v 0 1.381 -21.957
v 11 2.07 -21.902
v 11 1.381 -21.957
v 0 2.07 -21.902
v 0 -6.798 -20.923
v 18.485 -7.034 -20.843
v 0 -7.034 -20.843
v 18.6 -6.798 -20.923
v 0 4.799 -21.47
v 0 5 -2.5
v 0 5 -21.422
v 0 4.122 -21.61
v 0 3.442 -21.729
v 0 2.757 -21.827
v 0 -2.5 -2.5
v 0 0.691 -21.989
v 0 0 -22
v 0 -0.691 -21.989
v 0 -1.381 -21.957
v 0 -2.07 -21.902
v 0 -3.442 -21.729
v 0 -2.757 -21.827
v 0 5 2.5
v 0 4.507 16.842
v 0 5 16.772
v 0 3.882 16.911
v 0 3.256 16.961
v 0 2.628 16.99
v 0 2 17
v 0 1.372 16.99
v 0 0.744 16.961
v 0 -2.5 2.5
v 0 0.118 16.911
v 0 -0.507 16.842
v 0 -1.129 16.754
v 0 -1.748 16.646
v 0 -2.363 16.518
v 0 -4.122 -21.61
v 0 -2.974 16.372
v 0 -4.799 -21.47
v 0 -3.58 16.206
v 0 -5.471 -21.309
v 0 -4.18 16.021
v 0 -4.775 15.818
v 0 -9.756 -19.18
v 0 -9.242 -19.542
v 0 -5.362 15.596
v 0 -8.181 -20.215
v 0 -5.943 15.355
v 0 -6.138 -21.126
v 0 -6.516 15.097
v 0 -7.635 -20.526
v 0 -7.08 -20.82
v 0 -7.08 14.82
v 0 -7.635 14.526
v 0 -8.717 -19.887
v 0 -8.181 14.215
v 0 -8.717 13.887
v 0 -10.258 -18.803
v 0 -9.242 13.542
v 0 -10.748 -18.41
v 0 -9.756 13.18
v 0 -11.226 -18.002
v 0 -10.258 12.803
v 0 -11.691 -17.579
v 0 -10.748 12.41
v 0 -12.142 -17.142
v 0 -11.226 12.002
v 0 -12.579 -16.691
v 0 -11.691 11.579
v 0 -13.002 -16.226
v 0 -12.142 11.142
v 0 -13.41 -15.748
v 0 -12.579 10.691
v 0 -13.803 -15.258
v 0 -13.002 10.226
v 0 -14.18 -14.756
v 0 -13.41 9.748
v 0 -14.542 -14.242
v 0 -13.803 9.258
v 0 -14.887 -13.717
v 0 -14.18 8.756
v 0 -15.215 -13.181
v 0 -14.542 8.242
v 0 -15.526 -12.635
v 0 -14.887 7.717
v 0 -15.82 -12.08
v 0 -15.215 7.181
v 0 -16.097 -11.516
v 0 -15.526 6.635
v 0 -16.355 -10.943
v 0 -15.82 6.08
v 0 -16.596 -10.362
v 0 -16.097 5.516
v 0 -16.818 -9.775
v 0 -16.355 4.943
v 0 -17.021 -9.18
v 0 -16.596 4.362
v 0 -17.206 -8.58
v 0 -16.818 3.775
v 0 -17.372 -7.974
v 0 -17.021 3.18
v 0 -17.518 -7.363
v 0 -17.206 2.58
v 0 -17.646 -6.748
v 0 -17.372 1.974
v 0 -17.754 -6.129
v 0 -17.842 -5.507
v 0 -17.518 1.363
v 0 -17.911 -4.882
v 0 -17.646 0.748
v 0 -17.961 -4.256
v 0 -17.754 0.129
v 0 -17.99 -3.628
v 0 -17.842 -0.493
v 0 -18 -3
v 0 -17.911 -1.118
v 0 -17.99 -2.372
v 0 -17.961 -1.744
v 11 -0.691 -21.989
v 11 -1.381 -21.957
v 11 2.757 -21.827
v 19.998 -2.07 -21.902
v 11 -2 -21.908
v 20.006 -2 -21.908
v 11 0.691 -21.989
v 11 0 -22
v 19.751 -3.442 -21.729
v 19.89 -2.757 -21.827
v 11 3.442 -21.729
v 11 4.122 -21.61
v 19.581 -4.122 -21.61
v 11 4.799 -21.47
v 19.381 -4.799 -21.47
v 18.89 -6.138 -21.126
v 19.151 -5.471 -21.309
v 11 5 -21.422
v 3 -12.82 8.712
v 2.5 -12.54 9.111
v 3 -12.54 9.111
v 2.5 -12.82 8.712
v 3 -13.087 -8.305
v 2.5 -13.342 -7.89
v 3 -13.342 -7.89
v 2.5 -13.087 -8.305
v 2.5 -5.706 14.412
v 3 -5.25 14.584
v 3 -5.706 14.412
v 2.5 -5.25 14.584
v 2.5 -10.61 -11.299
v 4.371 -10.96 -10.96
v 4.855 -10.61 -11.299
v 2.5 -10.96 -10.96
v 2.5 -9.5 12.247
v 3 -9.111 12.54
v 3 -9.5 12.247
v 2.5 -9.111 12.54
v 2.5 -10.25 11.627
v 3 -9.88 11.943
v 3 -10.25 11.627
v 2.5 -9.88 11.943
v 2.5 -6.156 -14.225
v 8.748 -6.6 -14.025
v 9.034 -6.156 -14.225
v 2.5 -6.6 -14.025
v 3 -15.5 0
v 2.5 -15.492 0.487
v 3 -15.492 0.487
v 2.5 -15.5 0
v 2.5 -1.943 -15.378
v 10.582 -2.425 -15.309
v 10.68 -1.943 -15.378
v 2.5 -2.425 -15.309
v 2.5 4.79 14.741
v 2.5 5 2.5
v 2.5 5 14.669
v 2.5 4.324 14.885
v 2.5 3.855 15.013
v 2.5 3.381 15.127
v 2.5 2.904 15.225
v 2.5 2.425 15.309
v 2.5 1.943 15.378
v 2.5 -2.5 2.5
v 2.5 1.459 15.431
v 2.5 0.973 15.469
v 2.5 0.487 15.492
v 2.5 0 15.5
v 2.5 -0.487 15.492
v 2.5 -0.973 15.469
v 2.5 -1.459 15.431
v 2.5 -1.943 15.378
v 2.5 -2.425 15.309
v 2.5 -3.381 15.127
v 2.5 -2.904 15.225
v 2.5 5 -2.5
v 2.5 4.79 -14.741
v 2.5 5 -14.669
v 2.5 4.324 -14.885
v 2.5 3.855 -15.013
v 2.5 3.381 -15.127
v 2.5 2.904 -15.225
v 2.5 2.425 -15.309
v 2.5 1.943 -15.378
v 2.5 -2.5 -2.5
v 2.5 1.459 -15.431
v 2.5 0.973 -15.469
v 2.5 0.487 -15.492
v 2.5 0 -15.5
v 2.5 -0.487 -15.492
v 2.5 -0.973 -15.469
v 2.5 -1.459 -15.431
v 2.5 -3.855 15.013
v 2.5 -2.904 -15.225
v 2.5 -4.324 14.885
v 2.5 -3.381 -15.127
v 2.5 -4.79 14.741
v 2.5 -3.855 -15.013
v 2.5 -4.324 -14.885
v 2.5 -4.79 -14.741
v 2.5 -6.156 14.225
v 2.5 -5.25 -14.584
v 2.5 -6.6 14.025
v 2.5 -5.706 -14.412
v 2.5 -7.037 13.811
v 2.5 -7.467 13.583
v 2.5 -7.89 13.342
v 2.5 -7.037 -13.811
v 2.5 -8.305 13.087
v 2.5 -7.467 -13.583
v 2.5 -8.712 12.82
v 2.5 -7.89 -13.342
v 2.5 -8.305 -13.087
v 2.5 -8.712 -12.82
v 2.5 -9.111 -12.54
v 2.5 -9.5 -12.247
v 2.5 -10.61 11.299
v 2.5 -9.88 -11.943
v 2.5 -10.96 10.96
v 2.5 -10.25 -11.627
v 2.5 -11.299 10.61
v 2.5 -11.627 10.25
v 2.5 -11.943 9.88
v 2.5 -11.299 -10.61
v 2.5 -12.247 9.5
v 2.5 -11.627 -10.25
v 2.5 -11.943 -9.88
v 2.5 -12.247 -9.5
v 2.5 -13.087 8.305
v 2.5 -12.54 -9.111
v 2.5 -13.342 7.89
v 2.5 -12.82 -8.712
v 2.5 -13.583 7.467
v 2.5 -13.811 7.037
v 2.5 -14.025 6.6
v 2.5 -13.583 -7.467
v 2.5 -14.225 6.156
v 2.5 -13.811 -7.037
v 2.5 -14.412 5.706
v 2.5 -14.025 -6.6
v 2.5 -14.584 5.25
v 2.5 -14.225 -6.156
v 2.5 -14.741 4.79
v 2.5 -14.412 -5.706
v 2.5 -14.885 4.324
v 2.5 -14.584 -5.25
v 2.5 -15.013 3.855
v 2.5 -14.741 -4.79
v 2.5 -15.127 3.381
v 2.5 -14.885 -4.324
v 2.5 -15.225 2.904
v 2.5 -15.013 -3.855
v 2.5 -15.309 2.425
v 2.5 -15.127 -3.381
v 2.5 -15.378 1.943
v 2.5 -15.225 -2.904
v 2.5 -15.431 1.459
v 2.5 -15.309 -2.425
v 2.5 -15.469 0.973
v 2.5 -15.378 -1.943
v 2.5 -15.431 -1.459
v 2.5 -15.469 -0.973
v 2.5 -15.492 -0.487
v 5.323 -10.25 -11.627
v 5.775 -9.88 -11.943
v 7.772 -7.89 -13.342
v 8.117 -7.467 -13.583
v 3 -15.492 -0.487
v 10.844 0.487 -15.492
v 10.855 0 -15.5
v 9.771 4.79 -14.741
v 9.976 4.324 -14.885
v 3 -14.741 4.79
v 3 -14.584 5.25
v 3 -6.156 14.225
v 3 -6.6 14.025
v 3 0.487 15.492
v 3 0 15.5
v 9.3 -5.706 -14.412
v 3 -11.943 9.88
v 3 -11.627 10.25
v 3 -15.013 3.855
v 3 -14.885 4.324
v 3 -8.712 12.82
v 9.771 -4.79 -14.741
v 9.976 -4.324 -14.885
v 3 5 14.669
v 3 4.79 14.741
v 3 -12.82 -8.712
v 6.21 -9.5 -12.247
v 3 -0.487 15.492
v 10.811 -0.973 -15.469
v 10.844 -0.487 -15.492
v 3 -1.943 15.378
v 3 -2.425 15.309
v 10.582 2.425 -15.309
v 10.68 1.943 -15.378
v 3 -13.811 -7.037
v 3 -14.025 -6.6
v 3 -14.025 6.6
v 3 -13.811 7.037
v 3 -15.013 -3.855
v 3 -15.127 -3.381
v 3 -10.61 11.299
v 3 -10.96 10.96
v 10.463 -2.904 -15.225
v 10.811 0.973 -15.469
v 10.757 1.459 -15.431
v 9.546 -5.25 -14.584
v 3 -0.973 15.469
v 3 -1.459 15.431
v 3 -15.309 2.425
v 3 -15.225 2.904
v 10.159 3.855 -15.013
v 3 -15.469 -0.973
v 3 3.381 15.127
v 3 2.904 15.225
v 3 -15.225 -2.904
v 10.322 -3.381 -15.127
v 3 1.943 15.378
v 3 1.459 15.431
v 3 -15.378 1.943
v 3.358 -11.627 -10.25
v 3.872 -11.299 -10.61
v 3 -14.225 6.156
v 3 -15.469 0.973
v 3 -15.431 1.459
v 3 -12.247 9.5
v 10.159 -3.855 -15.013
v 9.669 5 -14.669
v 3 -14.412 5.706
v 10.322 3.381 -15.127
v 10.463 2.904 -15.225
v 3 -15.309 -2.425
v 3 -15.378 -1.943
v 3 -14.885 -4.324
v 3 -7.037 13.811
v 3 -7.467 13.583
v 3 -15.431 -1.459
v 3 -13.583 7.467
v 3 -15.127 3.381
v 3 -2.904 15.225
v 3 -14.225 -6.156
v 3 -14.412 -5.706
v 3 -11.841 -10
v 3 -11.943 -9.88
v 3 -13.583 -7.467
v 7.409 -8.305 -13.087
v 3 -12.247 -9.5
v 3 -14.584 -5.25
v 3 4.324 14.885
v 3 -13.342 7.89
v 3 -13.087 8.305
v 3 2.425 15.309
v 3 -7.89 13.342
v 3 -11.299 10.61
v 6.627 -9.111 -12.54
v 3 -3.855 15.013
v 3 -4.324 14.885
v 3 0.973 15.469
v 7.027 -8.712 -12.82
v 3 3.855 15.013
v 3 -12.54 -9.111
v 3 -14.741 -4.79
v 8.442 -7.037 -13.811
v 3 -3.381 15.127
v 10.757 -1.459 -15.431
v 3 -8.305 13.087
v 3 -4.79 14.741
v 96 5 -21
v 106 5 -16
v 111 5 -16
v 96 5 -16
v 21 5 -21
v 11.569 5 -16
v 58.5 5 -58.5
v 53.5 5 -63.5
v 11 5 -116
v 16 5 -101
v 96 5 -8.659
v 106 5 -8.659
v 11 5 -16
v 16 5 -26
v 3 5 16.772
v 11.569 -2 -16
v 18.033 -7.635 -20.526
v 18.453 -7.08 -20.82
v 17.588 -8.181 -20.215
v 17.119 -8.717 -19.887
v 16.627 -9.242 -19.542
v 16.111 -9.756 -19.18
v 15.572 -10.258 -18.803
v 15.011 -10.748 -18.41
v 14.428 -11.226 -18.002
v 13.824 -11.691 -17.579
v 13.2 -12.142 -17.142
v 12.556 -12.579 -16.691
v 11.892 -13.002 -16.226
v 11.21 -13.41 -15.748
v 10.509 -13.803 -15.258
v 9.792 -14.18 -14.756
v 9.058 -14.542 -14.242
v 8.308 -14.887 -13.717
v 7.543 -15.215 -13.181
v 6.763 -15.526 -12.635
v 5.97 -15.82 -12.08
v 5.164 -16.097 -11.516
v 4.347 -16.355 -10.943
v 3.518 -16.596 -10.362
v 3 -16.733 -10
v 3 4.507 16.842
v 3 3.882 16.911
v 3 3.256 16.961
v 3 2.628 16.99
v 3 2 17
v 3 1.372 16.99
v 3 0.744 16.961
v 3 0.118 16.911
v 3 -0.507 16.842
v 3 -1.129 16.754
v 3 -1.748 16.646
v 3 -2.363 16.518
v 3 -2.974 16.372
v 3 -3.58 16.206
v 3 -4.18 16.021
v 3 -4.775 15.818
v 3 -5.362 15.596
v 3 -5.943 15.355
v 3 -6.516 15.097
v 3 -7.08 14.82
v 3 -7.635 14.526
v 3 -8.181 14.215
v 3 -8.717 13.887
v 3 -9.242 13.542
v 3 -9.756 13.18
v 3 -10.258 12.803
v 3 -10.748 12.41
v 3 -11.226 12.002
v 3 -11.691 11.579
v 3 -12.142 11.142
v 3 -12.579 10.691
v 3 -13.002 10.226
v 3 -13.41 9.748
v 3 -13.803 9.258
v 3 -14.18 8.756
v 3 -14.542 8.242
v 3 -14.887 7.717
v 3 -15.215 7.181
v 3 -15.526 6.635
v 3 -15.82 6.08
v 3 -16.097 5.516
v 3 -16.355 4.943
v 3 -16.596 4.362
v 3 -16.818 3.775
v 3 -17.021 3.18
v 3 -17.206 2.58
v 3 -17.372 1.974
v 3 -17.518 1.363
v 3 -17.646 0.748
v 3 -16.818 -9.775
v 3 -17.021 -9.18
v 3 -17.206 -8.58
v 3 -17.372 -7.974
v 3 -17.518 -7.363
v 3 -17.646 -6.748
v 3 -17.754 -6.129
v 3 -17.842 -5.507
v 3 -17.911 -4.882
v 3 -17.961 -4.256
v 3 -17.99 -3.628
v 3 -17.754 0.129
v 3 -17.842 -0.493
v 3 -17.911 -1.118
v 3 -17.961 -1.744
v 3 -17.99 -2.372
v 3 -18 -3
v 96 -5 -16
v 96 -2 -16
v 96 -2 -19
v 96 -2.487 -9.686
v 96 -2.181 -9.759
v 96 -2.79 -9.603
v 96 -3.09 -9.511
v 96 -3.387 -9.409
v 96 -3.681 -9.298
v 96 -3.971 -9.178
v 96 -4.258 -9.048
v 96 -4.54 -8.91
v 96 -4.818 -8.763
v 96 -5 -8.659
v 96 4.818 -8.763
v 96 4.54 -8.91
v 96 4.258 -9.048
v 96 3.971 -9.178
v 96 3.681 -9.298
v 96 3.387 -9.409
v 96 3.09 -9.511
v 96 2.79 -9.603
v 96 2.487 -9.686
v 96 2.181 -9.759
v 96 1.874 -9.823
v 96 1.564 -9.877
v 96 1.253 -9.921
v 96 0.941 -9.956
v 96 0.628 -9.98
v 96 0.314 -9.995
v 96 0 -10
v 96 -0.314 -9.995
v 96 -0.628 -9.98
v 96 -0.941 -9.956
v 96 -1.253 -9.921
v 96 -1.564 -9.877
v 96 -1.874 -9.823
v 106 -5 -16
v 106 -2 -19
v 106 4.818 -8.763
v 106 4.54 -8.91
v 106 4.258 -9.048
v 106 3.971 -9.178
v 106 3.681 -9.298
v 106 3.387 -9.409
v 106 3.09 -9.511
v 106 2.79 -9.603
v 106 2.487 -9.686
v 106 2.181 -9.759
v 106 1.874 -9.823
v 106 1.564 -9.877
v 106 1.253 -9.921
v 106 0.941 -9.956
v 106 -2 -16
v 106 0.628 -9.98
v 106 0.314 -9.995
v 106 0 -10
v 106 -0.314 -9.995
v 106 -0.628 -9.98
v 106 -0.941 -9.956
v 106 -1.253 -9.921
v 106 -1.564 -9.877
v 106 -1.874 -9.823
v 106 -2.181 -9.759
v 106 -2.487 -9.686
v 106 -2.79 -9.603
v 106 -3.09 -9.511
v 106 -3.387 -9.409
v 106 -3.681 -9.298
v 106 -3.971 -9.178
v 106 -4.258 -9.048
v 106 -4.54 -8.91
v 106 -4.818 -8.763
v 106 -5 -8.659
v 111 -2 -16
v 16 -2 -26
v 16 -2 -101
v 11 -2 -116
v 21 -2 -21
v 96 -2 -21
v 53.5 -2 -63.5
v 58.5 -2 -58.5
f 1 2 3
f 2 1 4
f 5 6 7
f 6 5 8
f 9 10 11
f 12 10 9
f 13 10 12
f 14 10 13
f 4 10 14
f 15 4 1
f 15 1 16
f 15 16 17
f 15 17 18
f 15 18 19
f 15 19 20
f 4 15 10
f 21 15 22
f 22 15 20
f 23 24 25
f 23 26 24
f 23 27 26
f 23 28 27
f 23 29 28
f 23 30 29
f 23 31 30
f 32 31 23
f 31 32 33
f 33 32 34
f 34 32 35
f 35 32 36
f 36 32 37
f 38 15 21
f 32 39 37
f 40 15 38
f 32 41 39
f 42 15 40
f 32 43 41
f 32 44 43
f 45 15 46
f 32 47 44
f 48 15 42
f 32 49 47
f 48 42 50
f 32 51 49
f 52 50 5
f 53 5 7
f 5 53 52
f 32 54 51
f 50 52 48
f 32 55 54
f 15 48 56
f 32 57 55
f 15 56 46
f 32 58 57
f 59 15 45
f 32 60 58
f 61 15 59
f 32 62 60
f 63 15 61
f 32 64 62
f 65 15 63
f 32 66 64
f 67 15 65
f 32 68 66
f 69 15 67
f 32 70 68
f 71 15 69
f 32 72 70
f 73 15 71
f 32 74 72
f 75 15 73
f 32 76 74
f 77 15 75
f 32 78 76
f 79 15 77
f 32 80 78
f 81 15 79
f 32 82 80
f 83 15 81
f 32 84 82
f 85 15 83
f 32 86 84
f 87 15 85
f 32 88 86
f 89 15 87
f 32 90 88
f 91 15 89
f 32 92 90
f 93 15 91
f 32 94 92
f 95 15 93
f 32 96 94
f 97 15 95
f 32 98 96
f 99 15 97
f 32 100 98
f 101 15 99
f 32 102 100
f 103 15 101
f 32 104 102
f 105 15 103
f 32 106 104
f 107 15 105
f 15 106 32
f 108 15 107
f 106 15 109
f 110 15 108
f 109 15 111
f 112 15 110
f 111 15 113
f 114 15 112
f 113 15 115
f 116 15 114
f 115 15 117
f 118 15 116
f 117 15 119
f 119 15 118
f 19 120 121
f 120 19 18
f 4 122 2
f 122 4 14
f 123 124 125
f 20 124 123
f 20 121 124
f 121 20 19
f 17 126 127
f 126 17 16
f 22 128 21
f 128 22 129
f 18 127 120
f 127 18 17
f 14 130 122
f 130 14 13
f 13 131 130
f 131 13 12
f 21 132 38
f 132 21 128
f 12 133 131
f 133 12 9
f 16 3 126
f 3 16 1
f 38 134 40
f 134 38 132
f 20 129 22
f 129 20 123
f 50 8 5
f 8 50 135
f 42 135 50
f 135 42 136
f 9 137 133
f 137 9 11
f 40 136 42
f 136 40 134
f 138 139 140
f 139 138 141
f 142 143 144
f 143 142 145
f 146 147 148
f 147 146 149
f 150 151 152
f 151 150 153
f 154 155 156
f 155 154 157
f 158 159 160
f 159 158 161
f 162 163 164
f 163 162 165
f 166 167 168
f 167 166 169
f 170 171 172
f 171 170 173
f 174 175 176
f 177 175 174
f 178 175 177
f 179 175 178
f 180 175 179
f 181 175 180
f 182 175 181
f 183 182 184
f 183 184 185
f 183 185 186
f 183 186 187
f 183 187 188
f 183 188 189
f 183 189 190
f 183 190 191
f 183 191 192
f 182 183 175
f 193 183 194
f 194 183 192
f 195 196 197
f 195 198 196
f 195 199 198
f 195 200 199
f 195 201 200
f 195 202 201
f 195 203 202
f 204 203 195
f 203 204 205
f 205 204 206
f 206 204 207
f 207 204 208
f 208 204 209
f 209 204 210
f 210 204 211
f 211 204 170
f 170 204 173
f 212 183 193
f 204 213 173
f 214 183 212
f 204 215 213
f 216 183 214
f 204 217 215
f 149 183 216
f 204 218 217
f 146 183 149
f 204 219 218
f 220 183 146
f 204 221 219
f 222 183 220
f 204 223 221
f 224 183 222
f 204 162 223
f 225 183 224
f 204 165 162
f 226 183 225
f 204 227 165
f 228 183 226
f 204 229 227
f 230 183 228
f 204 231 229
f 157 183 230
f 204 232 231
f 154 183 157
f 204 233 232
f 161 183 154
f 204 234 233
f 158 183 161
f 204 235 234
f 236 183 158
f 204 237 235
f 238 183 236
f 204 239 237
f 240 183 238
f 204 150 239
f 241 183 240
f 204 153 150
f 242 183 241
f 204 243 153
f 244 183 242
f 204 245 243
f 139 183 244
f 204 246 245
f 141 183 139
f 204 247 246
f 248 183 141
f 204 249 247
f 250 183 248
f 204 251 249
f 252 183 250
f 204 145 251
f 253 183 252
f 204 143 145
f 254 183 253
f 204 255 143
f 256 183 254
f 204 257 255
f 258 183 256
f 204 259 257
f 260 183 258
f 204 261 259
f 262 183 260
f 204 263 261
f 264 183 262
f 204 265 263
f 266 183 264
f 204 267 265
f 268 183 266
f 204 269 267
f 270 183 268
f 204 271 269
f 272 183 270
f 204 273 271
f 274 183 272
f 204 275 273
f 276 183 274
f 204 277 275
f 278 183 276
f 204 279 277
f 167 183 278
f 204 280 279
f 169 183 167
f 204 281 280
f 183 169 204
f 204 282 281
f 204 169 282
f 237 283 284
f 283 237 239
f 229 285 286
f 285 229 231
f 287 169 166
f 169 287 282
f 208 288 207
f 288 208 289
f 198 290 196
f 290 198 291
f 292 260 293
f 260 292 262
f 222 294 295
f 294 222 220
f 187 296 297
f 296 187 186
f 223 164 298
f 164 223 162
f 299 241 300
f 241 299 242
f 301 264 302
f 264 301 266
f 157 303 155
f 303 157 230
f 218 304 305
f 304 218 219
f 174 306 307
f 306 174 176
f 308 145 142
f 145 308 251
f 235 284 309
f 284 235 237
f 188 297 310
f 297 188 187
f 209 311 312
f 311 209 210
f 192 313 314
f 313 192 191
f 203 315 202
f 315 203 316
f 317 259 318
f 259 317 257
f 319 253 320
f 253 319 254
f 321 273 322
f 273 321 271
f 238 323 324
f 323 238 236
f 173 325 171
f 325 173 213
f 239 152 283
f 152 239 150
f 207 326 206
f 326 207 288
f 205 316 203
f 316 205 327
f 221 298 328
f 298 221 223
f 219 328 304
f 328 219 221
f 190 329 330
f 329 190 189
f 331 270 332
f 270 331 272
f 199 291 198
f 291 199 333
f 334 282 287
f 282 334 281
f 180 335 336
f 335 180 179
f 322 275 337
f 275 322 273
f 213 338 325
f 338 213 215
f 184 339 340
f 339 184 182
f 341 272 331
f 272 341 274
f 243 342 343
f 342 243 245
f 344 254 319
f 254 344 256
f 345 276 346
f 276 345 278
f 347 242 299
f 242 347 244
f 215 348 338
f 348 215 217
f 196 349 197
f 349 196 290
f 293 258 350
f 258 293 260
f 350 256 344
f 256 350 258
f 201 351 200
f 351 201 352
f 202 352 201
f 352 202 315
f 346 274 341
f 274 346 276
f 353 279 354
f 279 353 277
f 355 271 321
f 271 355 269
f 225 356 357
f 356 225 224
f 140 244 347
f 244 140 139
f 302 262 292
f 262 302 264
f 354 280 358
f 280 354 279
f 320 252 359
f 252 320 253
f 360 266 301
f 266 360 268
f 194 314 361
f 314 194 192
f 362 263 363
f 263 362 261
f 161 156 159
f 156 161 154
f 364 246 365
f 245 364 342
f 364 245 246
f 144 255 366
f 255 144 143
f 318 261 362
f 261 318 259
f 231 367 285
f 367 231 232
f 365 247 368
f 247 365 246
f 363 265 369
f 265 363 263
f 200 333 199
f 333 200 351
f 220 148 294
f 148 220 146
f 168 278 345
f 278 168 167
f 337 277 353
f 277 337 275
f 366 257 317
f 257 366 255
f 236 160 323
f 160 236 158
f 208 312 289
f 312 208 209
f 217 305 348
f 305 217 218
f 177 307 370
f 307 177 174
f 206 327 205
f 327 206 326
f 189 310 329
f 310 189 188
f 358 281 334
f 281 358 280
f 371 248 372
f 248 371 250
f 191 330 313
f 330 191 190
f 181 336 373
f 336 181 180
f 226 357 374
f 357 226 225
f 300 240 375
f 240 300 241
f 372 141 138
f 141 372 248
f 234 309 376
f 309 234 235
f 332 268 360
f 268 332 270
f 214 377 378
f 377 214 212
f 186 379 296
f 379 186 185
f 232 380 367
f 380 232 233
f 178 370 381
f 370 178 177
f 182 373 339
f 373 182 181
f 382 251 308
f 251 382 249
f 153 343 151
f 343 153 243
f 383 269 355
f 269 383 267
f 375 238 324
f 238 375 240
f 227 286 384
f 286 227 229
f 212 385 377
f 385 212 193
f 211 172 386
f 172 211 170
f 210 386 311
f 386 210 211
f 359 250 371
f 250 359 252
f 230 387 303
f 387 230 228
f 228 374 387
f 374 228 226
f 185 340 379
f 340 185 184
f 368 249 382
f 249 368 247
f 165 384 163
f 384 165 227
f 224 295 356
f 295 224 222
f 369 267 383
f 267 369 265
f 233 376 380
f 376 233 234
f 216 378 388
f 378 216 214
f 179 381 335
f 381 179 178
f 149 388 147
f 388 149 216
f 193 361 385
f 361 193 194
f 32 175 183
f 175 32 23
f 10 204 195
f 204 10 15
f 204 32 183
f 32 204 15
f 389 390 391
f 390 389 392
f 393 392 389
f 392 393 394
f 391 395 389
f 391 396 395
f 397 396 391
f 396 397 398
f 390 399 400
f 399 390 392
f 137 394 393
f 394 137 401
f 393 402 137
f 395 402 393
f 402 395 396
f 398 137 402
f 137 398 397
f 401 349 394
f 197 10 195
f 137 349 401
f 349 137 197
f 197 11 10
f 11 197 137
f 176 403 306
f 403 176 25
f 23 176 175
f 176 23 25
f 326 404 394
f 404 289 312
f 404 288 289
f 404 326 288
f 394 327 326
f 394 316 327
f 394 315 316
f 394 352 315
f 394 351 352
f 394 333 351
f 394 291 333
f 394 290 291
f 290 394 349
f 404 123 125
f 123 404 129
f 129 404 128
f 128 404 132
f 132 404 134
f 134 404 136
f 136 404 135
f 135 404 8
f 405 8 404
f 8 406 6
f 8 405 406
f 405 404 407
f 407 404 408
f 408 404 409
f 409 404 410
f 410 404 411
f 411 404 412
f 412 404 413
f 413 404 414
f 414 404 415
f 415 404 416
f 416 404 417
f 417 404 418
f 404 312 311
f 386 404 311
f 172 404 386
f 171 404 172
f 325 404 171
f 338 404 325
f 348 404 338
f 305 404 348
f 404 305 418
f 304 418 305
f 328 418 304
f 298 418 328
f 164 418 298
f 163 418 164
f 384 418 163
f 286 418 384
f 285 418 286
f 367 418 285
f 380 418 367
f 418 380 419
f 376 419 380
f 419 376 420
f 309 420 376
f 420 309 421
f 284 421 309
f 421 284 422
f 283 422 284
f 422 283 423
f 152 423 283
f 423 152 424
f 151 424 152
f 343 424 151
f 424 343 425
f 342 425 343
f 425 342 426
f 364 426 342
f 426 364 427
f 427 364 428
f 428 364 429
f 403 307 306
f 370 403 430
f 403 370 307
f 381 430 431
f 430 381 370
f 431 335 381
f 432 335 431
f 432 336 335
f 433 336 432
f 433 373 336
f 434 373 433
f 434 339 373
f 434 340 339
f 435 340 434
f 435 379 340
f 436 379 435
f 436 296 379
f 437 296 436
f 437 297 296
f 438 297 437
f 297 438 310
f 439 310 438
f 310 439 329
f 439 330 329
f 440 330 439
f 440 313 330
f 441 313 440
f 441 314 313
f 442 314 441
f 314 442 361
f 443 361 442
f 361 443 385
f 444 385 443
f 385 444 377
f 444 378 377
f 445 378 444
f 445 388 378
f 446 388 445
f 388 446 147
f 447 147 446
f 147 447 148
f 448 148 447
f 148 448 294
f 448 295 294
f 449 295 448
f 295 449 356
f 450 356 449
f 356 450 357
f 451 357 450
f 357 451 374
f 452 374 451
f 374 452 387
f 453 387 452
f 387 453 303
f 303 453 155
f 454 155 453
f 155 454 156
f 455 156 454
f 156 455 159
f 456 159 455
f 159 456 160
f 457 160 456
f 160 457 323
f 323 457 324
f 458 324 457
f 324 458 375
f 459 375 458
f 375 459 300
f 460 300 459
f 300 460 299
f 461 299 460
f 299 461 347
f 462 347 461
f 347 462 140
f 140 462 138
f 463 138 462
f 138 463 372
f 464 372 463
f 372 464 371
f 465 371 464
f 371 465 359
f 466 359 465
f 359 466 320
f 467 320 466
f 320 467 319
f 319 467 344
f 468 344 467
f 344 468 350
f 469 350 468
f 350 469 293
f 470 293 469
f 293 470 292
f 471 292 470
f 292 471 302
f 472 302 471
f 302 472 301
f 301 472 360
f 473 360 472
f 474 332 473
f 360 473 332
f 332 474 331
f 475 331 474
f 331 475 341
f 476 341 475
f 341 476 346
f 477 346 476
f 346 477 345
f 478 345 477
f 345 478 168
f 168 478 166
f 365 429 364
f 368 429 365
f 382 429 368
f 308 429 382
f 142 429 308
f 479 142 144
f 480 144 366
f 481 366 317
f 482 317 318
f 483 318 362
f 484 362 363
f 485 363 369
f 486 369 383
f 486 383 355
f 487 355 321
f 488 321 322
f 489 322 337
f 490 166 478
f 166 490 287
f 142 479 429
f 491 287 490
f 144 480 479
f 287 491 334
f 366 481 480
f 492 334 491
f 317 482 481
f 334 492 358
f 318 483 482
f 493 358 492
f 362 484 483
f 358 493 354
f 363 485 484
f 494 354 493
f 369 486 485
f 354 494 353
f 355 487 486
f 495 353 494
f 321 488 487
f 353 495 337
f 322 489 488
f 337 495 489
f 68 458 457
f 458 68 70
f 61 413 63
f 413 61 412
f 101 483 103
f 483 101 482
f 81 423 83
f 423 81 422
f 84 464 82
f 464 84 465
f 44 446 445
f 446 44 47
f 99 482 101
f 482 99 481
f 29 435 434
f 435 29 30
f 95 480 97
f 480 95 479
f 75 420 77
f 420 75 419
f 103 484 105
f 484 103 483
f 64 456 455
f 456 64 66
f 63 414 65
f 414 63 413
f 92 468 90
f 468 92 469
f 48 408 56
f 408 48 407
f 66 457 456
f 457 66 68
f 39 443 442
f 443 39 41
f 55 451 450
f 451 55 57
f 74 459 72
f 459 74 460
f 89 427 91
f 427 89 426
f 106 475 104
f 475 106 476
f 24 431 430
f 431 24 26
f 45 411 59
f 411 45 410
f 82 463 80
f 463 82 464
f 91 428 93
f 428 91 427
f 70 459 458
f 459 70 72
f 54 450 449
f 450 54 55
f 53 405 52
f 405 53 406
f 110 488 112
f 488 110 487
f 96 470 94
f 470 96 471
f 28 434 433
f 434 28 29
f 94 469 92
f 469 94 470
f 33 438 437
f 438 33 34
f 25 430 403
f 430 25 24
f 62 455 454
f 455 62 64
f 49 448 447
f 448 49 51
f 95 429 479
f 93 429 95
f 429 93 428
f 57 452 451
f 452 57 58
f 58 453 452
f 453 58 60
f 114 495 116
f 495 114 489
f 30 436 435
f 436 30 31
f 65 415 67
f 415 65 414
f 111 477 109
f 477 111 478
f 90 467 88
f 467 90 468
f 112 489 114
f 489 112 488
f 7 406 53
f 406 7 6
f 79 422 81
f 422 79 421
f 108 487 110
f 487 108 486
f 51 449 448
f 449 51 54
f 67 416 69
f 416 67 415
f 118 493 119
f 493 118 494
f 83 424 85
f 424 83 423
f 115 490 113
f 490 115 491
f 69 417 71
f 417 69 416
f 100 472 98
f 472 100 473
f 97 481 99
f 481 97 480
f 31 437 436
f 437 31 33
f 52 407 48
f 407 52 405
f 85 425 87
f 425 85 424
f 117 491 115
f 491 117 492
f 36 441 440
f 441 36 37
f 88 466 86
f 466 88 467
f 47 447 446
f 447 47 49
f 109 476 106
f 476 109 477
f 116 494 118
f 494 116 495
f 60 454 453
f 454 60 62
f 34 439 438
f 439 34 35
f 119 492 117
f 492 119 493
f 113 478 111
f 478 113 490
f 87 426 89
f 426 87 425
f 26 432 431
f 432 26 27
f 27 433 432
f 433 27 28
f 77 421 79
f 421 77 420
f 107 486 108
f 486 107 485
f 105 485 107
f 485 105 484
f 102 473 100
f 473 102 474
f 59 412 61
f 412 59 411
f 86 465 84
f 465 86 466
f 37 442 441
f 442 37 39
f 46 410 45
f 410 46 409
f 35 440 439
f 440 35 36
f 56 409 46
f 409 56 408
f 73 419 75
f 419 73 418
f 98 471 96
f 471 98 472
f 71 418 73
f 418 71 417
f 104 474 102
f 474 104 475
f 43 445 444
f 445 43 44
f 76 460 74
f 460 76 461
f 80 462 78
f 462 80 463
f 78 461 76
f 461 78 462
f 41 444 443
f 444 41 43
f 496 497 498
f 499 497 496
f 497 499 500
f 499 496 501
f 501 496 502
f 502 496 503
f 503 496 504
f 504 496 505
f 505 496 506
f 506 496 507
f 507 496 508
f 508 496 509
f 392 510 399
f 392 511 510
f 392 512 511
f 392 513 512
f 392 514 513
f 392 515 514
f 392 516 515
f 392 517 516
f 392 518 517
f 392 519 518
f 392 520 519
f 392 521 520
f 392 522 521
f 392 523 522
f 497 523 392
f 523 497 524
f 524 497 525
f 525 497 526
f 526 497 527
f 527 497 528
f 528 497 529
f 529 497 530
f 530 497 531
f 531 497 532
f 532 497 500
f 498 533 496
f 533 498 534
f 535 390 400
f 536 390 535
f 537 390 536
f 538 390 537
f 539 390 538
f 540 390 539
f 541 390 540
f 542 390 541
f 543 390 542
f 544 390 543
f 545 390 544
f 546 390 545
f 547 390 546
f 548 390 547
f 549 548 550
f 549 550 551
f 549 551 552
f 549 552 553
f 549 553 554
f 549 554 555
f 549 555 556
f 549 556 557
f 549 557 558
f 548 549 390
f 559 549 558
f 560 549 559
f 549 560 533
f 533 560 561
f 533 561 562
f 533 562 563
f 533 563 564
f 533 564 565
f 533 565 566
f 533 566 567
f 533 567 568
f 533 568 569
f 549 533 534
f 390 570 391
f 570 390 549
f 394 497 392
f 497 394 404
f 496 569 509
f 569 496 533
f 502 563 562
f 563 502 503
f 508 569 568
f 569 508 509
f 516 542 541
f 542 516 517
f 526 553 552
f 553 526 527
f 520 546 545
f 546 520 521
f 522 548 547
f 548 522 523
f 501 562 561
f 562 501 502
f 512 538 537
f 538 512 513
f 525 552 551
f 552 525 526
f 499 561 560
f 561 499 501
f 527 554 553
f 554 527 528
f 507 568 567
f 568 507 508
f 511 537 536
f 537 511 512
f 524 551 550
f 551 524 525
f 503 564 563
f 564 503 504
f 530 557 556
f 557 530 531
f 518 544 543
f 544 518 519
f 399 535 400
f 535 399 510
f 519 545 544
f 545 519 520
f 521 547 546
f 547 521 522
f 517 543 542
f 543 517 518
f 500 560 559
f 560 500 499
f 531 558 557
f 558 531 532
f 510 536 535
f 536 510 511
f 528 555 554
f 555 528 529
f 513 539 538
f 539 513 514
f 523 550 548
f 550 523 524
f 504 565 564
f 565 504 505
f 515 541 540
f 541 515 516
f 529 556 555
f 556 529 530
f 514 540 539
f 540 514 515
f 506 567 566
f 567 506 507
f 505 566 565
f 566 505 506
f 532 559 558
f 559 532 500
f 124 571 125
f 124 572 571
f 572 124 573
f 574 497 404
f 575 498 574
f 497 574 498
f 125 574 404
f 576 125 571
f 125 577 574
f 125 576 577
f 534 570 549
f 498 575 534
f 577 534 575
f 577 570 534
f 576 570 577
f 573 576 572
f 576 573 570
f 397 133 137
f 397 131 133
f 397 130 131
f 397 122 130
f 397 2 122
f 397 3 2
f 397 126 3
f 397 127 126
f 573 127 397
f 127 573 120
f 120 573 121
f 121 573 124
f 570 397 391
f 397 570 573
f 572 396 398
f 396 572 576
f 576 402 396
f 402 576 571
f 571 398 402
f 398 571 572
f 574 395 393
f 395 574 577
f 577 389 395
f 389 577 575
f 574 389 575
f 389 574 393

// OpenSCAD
$fn = 200;

module wall() {
    translate([0, -50, 0]) cube([5, 100, 100]);
    translate([-10, -50, -100]) cube([15, 100, 100]);
    translate([-2.5, 0, 25]) rotate([0, -90, 0]) cylinder(8, 15, 15);
    translate([-2.5, 0, 25]) rotate([0, -90, 0]) cylinder(120, 10, 10);
}

module support() {
    // wall fastener
    intersection() {
        difference() {
            rotate([0, 90, 0]) cylinder(30, 22, 22);
            translate([2.5, 0, 0]) rotate([0, 90, 0]) cylinder(20, 15.5, 15.5);
            translate([-3, 7.5, 0]) cube([20, 20, 5], true);
            translate([-1, 5, -50]) cube([100, 100, 100]);
            translate([3, -50, -10]) rotate([0, 35, 0]) cube([100, 100, 100]);
            translate([3, -50, -10]) cube([100, 100, 100]);
        }
        translate([0, 2, -3]) scale([1, 1, 1]) 
            rotate([0, 90, 0]) cylinder(30, 20, 20);
    }
    
    // support lines
    translate([11, -2, -16]) rotate([-90, 0, 0])
    linear_extrude(7)
    polygon([
        [0, 0], [0, 100], [100, 0],
        [5, 10], [5, 85], [42.5, 47.5],
        [10, 5], [85, 5], [47.5, 42.5]
    ],
    paths=[[0, 1, 2], [3, 4, 5], [6, 7, 8]]);
    
    // tube shelf
    translate([96, -5, -16]) 
    difference() {
        union() {
            rotate([0, 90, 0])
            linear_extrude(10) polygon([[0, 0], [0, 5], [5, 5]]);
            cube([10, 10, 8]);
        }
        translate([-1, 5, 16]) rotate([0, 90, 0]) cylinder(12, 10, 10);
    }
    
}

%color(alpha=0.3) translate([0, 0, -25]) rotate([0, 0, 180]) wall();
support();
